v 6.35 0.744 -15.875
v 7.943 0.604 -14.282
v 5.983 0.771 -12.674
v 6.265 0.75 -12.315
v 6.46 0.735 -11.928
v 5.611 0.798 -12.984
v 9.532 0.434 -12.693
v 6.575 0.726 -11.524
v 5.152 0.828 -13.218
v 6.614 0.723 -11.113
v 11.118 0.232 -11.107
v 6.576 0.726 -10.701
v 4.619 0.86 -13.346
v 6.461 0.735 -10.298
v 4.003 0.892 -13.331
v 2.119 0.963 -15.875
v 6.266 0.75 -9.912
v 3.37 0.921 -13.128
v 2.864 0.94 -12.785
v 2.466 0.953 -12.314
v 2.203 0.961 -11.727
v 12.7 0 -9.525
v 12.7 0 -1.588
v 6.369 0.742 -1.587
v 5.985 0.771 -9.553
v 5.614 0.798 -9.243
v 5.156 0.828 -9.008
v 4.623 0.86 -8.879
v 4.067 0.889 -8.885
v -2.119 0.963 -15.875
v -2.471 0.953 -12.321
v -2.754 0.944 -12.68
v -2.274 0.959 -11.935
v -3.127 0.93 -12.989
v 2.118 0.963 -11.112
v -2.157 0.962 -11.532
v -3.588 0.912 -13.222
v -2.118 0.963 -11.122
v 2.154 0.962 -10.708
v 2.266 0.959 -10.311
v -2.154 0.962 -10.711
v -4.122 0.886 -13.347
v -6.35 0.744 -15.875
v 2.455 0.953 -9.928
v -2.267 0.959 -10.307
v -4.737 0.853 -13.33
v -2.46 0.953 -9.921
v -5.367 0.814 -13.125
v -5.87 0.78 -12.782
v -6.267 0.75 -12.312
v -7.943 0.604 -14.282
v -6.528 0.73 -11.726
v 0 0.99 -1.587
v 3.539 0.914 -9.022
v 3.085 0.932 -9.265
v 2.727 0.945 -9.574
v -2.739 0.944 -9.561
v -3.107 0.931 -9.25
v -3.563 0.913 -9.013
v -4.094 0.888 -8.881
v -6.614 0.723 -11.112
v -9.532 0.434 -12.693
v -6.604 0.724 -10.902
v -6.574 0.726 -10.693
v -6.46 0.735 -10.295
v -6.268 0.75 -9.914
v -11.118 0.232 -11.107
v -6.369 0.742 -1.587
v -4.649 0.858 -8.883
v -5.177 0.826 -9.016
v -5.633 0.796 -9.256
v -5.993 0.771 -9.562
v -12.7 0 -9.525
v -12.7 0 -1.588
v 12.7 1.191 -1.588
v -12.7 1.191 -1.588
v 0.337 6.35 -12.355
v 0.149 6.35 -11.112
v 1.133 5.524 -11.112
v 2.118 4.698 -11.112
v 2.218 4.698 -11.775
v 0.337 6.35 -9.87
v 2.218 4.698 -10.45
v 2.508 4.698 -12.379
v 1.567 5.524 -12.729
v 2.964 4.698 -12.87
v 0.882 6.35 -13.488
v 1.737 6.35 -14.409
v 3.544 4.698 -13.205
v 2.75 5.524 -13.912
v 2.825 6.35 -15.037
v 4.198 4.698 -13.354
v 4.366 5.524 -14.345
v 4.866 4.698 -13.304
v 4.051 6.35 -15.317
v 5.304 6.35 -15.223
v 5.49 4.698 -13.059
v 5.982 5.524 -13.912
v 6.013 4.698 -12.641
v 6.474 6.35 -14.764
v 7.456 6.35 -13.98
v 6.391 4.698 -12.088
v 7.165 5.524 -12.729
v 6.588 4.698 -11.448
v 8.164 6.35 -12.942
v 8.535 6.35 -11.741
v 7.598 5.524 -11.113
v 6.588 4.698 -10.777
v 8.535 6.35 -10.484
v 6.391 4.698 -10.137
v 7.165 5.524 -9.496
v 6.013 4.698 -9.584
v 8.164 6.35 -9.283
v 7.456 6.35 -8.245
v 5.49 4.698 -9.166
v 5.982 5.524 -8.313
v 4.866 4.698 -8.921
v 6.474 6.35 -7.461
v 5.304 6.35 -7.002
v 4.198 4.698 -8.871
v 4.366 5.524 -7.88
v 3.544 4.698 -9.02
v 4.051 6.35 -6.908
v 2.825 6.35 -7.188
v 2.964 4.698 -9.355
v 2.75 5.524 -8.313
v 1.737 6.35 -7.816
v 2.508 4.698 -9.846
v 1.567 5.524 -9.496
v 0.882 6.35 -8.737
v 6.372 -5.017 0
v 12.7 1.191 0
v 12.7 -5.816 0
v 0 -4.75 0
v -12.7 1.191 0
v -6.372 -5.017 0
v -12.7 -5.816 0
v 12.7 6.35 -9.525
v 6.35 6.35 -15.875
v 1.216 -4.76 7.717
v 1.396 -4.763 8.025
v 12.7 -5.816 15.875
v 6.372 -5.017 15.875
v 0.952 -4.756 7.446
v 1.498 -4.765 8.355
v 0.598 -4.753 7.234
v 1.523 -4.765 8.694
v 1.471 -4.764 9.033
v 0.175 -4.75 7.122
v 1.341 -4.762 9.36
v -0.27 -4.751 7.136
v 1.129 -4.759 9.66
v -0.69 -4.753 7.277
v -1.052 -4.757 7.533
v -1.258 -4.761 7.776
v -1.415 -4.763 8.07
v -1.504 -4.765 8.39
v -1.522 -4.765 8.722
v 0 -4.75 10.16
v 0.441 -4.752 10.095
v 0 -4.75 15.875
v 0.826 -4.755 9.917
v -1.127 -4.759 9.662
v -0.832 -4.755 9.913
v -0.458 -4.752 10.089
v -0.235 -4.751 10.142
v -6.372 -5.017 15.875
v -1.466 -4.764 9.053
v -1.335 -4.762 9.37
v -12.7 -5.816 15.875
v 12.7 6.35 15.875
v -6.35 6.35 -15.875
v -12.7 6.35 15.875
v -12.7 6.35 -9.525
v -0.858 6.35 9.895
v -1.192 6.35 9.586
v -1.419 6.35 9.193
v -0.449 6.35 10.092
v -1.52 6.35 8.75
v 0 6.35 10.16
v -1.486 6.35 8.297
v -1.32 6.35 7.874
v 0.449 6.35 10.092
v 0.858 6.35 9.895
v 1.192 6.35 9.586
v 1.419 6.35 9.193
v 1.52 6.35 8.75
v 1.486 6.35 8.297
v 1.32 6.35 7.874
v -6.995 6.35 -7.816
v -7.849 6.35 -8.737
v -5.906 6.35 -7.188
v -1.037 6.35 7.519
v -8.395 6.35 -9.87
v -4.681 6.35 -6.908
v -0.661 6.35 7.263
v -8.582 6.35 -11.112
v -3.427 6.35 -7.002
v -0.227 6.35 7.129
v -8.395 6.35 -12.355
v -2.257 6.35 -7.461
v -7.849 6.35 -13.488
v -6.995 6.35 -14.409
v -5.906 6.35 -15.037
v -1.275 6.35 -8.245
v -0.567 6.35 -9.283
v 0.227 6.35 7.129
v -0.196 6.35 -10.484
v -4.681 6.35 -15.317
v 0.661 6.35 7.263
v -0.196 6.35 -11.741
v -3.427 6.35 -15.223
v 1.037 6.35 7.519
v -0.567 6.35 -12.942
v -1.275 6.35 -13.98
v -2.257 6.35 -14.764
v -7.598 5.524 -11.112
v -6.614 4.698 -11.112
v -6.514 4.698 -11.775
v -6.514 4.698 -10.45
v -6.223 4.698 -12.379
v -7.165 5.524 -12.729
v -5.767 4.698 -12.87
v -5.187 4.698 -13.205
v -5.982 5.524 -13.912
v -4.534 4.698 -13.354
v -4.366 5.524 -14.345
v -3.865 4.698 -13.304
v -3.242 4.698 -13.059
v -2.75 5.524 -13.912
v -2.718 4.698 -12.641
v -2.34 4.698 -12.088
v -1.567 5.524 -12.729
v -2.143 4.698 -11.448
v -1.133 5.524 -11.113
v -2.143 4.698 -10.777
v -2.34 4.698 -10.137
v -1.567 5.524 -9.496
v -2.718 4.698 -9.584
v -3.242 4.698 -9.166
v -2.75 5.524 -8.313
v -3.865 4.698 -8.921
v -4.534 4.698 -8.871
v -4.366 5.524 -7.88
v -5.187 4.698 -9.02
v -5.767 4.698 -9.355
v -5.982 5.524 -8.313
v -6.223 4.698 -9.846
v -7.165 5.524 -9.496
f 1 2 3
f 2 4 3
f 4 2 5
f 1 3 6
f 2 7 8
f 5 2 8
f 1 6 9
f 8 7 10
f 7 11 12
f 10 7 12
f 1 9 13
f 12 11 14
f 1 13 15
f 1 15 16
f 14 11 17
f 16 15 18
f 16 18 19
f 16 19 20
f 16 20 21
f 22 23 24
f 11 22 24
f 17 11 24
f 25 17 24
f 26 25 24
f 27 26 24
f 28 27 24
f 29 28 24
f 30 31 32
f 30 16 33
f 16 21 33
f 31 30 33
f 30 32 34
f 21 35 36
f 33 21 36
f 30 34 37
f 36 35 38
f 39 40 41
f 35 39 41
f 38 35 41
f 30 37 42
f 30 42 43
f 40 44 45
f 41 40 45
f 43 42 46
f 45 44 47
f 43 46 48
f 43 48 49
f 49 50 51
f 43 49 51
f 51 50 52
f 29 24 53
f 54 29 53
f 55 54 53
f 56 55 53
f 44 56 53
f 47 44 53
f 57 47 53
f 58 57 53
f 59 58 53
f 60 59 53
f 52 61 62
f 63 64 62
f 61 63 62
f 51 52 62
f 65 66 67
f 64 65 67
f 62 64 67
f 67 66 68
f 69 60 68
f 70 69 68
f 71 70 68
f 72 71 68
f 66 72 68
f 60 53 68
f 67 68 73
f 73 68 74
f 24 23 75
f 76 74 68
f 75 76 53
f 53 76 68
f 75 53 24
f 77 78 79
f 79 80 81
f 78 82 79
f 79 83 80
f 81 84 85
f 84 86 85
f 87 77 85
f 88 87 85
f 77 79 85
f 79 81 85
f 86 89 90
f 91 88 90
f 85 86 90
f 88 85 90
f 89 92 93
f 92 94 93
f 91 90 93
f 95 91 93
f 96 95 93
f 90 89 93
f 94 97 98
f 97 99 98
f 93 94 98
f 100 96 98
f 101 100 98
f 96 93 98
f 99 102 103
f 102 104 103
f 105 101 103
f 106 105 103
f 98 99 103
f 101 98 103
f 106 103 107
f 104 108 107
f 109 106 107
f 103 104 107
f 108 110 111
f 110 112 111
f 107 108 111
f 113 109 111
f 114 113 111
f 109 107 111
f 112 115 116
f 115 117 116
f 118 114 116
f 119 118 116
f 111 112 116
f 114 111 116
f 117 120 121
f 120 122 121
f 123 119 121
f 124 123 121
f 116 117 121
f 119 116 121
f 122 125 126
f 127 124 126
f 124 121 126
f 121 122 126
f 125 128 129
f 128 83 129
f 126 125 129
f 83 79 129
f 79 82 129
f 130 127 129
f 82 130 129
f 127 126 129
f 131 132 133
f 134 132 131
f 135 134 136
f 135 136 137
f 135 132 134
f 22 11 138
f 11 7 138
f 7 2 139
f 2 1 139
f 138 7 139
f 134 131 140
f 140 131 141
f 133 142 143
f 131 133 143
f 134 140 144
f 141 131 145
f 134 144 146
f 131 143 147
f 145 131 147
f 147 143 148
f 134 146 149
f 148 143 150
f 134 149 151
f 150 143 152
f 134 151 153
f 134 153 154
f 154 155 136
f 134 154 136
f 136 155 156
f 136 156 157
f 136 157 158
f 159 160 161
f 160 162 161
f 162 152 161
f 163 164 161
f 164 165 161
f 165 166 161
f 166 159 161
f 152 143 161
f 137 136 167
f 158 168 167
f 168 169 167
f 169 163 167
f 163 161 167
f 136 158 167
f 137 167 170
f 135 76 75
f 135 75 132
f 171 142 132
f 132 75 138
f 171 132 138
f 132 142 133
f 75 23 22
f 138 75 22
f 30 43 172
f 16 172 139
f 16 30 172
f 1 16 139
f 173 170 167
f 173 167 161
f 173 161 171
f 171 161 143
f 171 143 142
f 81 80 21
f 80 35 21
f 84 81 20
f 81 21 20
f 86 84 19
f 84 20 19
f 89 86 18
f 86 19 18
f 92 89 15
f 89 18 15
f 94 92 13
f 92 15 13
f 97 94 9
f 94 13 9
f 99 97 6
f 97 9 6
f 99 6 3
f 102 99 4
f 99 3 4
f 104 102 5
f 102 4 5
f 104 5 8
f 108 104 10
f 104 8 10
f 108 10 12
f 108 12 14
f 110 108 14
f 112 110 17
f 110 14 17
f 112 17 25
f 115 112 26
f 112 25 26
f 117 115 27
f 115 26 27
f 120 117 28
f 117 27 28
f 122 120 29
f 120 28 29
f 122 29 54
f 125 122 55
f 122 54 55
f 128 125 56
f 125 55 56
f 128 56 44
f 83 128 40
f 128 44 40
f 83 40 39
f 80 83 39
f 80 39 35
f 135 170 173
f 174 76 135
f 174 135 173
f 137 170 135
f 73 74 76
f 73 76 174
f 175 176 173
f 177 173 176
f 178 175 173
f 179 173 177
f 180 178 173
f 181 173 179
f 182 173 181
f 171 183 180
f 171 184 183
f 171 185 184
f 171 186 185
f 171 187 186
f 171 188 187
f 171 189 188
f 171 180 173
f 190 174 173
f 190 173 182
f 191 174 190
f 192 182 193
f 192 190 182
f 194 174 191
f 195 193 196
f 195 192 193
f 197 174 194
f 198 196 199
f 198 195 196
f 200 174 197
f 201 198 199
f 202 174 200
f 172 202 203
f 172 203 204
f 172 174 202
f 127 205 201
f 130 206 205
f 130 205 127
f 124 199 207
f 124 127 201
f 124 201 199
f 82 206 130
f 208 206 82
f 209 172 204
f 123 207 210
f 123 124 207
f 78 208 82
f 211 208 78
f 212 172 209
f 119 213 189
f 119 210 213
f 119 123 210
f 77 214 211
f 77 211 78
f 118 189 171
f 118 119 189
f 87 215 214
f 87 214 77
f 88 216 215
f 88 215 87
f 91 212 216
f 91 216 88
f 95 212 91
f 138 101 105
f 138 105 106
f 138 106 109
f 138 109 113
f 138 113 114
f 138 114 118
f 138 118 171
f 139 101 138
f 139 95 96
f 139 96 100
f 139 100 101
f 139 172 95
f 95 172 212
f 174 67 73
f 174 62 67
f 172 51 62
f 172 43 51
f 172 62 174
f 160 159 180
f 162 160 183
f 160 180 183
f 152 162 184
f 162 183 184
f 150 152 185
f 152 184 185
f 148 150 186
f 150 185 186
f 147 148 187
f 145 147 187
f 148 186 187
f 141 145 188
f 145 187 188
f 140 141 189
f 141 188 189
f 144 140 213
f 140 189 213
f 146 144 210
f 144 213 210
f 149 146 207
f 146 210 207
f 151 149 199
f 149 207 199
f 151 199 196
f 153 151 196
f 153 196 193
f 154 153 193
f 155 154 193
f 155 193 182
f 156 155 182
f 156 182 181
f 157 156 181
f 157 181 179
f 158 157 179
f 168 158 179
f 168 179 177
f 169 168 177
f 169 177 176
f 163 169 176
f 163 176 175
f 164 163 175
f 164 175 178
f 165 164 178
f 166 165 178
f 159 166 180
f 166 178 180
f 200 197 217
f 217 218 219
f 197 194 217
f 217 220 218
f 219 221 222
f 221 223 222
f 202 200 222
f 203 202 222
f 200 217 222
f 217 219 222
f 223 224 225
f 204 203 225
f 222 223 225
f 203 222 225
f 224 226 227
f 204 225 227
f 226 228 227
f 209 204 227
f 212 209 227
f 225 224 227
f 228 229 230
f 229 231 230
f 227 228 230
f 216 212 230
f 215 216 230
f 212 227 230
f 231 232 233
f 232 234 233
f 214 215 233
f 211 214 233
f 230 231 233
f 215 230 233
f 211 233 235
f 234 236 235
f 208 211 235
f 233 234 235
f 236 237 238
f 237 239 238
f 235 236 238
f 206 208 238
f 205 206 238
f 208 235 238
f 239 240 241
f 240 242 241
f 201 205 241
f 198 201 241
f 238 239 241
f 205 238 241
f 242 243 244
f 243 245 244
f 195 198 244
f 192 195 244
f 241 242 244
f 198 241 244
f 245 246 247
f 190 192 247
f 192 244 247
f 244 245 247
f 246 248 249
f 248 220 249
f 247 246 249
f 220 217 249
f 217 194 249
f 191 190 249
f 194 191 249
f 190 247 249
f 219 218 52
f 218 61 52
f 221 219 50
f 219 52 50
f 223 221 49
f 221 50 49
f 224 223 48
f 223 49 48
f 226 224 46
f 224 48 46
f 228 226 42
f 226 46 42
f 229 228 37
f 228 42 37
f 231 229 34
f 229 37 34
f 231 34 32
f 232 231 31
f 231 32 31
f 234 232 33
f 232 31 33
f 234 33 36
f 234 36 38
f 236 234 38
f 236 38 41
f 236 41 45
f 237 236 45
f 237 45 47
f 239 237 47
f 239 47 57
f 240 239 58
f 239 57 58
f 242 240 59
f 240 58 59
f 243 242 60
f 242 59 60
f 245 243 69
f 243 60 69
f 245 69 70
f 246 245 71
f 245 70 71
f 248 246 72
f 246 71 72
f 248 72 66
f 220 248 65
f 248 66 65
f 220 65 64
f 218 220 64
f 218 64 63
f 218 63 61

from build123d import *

# Parameters (mm, degrees)
SKETCH1_W                                         = 25.4
SKETCH1_H                                         = 31.75
BOSS_EXTRUDE1_DEPTH                               = 6.35
CUT_EXTRUDE1_DEPTH                                = 35.780382402
BOSS_EXTRUDE2_DEPTH                               = 15.875
SKETCH4_W                                         = 1.5875
SKETCH4_H                                         = 1.190625
CUT_EXTRUDE2_DEPTH                                = 31.618591166
CHAMFER1_SIZE                                     = 6.35
SKETCH5_R                                         = 1.524
CUT_EXTRUDE3_DEPTH                                = 24.692140063
CSK_FOR_8_FLAT_HEAD_MACHINE_SCREW_100_D           = 4.4958
CSK_FOR_8_FLAT_HEAD_MACHINE_SCREW_100_CSINK_D     = 8.4328
CSK_FOR_8_FLAT_HEAD_MACHINE_SCREW_100_CSINK_ANGLE = 100


with BuildPart() as part:
    # Sketch1 → Boss-Extrude1 (new body)
    with BuildSketch(Plane(origin=(0, 0, 0), x_dir=(1, 0, 0), z_dir=(0, 1, 0))):
        Rectangle(SKETCH1_W, SKETCH1_H)
    extrude(amount=BOSS_EXTRUDE1_DEPTH)

    # Sketch2 → Cut-Extrude1 (cut, through all)
    with BuildSketch(Plane.XY.offset(15.875)):
        with BuildLine():
            Line((-12.7, 0), (12.7, 0))
            ThreePointArc((12.7, 0), (0, 0.990173613), (-12.7, 0))
        make_face()
    extrude(amount=-CUT_EXTRUDE1_DEPTH, mode=Mode.SUBTRACT)

    # Sketch3 → Boss-Extrude2 (add)
    with BuildSketch(Plane.XY.offset(15.875)):
        with BuildLine():
            Line((-12.7, 6.35), (12.7, 6.35))
            Line((12.7, 6.35), (12.7, -5.816013142))
            ThreePointArc((12.7, -5.816013142), (0, -4.750226387), (-12.7, -5.816013142))
            Line((-12.7, -5.816013142), (-12.7, 6.35))
        make_face()
    extrude(amount=-BOSS_EXTRUDE2_DEPTH)

    # Sketch4 → Cut-Extrude2 (cut, through all)
    with BuildSketch(Plane.ZY.offset(12.7)):
        with Locations((-0.79375, 0.5953125)):
            Rectangle(SKETCH4_W, SKETCH4_H)
    extrude(amount=-CUT_EXTRUDE2_DEPTH, mode=Mode.SUBTRACT)

    # Chamfer1
    chamfer1_edges = [part.edges().sort_by_distance(p)[0] for p in [
        (-12.7, 3.175, -15.875),
        (12.7, 3.175, -15.875),
    ]]
    chamfer(chamfer1_edges, length=CHAMFER1_SIZE)

    # Sketch5 → Cut-Extrude3 (cut, through all)
    with BuildSketch(Plane(origin=(0, 6.35, 0), x_dir=(1, 0, 0), z_dir=(0, 1, 0))):
        with Locations(Location((0, -8.636, 0), (0, 0, 270))):
            Circle(SKETCH5_R)
    extrude(amount=-CUT_EXTRUDE3_DEPTH, mode=Mode.SUBTRACT)

    # CSK for #8 Flat Head Machine Screw (100)1 (through all)
    with Locations(Plane(origin=(0, 6.35, 0), x_dir=(1, 0, 0), z_dir=(0, 1, 0))):
        with Locations((-4.365625, 11.1125), (4.365625, 11.1125)):
            CounterSinkHole(CSK_FOR_8_FLAT_HEAD_MACHINE_SCREW_100_D / 2, CSK_FOR_8_FLAT_HEAD_MACHINE_SCREW_100_CSINK_D / 2, counter_sink_angle=CSK_FOR_8_FLAT_HEAD_MACHINE_SCREW_100_CSINK_ANGLE)


solid = part.part
